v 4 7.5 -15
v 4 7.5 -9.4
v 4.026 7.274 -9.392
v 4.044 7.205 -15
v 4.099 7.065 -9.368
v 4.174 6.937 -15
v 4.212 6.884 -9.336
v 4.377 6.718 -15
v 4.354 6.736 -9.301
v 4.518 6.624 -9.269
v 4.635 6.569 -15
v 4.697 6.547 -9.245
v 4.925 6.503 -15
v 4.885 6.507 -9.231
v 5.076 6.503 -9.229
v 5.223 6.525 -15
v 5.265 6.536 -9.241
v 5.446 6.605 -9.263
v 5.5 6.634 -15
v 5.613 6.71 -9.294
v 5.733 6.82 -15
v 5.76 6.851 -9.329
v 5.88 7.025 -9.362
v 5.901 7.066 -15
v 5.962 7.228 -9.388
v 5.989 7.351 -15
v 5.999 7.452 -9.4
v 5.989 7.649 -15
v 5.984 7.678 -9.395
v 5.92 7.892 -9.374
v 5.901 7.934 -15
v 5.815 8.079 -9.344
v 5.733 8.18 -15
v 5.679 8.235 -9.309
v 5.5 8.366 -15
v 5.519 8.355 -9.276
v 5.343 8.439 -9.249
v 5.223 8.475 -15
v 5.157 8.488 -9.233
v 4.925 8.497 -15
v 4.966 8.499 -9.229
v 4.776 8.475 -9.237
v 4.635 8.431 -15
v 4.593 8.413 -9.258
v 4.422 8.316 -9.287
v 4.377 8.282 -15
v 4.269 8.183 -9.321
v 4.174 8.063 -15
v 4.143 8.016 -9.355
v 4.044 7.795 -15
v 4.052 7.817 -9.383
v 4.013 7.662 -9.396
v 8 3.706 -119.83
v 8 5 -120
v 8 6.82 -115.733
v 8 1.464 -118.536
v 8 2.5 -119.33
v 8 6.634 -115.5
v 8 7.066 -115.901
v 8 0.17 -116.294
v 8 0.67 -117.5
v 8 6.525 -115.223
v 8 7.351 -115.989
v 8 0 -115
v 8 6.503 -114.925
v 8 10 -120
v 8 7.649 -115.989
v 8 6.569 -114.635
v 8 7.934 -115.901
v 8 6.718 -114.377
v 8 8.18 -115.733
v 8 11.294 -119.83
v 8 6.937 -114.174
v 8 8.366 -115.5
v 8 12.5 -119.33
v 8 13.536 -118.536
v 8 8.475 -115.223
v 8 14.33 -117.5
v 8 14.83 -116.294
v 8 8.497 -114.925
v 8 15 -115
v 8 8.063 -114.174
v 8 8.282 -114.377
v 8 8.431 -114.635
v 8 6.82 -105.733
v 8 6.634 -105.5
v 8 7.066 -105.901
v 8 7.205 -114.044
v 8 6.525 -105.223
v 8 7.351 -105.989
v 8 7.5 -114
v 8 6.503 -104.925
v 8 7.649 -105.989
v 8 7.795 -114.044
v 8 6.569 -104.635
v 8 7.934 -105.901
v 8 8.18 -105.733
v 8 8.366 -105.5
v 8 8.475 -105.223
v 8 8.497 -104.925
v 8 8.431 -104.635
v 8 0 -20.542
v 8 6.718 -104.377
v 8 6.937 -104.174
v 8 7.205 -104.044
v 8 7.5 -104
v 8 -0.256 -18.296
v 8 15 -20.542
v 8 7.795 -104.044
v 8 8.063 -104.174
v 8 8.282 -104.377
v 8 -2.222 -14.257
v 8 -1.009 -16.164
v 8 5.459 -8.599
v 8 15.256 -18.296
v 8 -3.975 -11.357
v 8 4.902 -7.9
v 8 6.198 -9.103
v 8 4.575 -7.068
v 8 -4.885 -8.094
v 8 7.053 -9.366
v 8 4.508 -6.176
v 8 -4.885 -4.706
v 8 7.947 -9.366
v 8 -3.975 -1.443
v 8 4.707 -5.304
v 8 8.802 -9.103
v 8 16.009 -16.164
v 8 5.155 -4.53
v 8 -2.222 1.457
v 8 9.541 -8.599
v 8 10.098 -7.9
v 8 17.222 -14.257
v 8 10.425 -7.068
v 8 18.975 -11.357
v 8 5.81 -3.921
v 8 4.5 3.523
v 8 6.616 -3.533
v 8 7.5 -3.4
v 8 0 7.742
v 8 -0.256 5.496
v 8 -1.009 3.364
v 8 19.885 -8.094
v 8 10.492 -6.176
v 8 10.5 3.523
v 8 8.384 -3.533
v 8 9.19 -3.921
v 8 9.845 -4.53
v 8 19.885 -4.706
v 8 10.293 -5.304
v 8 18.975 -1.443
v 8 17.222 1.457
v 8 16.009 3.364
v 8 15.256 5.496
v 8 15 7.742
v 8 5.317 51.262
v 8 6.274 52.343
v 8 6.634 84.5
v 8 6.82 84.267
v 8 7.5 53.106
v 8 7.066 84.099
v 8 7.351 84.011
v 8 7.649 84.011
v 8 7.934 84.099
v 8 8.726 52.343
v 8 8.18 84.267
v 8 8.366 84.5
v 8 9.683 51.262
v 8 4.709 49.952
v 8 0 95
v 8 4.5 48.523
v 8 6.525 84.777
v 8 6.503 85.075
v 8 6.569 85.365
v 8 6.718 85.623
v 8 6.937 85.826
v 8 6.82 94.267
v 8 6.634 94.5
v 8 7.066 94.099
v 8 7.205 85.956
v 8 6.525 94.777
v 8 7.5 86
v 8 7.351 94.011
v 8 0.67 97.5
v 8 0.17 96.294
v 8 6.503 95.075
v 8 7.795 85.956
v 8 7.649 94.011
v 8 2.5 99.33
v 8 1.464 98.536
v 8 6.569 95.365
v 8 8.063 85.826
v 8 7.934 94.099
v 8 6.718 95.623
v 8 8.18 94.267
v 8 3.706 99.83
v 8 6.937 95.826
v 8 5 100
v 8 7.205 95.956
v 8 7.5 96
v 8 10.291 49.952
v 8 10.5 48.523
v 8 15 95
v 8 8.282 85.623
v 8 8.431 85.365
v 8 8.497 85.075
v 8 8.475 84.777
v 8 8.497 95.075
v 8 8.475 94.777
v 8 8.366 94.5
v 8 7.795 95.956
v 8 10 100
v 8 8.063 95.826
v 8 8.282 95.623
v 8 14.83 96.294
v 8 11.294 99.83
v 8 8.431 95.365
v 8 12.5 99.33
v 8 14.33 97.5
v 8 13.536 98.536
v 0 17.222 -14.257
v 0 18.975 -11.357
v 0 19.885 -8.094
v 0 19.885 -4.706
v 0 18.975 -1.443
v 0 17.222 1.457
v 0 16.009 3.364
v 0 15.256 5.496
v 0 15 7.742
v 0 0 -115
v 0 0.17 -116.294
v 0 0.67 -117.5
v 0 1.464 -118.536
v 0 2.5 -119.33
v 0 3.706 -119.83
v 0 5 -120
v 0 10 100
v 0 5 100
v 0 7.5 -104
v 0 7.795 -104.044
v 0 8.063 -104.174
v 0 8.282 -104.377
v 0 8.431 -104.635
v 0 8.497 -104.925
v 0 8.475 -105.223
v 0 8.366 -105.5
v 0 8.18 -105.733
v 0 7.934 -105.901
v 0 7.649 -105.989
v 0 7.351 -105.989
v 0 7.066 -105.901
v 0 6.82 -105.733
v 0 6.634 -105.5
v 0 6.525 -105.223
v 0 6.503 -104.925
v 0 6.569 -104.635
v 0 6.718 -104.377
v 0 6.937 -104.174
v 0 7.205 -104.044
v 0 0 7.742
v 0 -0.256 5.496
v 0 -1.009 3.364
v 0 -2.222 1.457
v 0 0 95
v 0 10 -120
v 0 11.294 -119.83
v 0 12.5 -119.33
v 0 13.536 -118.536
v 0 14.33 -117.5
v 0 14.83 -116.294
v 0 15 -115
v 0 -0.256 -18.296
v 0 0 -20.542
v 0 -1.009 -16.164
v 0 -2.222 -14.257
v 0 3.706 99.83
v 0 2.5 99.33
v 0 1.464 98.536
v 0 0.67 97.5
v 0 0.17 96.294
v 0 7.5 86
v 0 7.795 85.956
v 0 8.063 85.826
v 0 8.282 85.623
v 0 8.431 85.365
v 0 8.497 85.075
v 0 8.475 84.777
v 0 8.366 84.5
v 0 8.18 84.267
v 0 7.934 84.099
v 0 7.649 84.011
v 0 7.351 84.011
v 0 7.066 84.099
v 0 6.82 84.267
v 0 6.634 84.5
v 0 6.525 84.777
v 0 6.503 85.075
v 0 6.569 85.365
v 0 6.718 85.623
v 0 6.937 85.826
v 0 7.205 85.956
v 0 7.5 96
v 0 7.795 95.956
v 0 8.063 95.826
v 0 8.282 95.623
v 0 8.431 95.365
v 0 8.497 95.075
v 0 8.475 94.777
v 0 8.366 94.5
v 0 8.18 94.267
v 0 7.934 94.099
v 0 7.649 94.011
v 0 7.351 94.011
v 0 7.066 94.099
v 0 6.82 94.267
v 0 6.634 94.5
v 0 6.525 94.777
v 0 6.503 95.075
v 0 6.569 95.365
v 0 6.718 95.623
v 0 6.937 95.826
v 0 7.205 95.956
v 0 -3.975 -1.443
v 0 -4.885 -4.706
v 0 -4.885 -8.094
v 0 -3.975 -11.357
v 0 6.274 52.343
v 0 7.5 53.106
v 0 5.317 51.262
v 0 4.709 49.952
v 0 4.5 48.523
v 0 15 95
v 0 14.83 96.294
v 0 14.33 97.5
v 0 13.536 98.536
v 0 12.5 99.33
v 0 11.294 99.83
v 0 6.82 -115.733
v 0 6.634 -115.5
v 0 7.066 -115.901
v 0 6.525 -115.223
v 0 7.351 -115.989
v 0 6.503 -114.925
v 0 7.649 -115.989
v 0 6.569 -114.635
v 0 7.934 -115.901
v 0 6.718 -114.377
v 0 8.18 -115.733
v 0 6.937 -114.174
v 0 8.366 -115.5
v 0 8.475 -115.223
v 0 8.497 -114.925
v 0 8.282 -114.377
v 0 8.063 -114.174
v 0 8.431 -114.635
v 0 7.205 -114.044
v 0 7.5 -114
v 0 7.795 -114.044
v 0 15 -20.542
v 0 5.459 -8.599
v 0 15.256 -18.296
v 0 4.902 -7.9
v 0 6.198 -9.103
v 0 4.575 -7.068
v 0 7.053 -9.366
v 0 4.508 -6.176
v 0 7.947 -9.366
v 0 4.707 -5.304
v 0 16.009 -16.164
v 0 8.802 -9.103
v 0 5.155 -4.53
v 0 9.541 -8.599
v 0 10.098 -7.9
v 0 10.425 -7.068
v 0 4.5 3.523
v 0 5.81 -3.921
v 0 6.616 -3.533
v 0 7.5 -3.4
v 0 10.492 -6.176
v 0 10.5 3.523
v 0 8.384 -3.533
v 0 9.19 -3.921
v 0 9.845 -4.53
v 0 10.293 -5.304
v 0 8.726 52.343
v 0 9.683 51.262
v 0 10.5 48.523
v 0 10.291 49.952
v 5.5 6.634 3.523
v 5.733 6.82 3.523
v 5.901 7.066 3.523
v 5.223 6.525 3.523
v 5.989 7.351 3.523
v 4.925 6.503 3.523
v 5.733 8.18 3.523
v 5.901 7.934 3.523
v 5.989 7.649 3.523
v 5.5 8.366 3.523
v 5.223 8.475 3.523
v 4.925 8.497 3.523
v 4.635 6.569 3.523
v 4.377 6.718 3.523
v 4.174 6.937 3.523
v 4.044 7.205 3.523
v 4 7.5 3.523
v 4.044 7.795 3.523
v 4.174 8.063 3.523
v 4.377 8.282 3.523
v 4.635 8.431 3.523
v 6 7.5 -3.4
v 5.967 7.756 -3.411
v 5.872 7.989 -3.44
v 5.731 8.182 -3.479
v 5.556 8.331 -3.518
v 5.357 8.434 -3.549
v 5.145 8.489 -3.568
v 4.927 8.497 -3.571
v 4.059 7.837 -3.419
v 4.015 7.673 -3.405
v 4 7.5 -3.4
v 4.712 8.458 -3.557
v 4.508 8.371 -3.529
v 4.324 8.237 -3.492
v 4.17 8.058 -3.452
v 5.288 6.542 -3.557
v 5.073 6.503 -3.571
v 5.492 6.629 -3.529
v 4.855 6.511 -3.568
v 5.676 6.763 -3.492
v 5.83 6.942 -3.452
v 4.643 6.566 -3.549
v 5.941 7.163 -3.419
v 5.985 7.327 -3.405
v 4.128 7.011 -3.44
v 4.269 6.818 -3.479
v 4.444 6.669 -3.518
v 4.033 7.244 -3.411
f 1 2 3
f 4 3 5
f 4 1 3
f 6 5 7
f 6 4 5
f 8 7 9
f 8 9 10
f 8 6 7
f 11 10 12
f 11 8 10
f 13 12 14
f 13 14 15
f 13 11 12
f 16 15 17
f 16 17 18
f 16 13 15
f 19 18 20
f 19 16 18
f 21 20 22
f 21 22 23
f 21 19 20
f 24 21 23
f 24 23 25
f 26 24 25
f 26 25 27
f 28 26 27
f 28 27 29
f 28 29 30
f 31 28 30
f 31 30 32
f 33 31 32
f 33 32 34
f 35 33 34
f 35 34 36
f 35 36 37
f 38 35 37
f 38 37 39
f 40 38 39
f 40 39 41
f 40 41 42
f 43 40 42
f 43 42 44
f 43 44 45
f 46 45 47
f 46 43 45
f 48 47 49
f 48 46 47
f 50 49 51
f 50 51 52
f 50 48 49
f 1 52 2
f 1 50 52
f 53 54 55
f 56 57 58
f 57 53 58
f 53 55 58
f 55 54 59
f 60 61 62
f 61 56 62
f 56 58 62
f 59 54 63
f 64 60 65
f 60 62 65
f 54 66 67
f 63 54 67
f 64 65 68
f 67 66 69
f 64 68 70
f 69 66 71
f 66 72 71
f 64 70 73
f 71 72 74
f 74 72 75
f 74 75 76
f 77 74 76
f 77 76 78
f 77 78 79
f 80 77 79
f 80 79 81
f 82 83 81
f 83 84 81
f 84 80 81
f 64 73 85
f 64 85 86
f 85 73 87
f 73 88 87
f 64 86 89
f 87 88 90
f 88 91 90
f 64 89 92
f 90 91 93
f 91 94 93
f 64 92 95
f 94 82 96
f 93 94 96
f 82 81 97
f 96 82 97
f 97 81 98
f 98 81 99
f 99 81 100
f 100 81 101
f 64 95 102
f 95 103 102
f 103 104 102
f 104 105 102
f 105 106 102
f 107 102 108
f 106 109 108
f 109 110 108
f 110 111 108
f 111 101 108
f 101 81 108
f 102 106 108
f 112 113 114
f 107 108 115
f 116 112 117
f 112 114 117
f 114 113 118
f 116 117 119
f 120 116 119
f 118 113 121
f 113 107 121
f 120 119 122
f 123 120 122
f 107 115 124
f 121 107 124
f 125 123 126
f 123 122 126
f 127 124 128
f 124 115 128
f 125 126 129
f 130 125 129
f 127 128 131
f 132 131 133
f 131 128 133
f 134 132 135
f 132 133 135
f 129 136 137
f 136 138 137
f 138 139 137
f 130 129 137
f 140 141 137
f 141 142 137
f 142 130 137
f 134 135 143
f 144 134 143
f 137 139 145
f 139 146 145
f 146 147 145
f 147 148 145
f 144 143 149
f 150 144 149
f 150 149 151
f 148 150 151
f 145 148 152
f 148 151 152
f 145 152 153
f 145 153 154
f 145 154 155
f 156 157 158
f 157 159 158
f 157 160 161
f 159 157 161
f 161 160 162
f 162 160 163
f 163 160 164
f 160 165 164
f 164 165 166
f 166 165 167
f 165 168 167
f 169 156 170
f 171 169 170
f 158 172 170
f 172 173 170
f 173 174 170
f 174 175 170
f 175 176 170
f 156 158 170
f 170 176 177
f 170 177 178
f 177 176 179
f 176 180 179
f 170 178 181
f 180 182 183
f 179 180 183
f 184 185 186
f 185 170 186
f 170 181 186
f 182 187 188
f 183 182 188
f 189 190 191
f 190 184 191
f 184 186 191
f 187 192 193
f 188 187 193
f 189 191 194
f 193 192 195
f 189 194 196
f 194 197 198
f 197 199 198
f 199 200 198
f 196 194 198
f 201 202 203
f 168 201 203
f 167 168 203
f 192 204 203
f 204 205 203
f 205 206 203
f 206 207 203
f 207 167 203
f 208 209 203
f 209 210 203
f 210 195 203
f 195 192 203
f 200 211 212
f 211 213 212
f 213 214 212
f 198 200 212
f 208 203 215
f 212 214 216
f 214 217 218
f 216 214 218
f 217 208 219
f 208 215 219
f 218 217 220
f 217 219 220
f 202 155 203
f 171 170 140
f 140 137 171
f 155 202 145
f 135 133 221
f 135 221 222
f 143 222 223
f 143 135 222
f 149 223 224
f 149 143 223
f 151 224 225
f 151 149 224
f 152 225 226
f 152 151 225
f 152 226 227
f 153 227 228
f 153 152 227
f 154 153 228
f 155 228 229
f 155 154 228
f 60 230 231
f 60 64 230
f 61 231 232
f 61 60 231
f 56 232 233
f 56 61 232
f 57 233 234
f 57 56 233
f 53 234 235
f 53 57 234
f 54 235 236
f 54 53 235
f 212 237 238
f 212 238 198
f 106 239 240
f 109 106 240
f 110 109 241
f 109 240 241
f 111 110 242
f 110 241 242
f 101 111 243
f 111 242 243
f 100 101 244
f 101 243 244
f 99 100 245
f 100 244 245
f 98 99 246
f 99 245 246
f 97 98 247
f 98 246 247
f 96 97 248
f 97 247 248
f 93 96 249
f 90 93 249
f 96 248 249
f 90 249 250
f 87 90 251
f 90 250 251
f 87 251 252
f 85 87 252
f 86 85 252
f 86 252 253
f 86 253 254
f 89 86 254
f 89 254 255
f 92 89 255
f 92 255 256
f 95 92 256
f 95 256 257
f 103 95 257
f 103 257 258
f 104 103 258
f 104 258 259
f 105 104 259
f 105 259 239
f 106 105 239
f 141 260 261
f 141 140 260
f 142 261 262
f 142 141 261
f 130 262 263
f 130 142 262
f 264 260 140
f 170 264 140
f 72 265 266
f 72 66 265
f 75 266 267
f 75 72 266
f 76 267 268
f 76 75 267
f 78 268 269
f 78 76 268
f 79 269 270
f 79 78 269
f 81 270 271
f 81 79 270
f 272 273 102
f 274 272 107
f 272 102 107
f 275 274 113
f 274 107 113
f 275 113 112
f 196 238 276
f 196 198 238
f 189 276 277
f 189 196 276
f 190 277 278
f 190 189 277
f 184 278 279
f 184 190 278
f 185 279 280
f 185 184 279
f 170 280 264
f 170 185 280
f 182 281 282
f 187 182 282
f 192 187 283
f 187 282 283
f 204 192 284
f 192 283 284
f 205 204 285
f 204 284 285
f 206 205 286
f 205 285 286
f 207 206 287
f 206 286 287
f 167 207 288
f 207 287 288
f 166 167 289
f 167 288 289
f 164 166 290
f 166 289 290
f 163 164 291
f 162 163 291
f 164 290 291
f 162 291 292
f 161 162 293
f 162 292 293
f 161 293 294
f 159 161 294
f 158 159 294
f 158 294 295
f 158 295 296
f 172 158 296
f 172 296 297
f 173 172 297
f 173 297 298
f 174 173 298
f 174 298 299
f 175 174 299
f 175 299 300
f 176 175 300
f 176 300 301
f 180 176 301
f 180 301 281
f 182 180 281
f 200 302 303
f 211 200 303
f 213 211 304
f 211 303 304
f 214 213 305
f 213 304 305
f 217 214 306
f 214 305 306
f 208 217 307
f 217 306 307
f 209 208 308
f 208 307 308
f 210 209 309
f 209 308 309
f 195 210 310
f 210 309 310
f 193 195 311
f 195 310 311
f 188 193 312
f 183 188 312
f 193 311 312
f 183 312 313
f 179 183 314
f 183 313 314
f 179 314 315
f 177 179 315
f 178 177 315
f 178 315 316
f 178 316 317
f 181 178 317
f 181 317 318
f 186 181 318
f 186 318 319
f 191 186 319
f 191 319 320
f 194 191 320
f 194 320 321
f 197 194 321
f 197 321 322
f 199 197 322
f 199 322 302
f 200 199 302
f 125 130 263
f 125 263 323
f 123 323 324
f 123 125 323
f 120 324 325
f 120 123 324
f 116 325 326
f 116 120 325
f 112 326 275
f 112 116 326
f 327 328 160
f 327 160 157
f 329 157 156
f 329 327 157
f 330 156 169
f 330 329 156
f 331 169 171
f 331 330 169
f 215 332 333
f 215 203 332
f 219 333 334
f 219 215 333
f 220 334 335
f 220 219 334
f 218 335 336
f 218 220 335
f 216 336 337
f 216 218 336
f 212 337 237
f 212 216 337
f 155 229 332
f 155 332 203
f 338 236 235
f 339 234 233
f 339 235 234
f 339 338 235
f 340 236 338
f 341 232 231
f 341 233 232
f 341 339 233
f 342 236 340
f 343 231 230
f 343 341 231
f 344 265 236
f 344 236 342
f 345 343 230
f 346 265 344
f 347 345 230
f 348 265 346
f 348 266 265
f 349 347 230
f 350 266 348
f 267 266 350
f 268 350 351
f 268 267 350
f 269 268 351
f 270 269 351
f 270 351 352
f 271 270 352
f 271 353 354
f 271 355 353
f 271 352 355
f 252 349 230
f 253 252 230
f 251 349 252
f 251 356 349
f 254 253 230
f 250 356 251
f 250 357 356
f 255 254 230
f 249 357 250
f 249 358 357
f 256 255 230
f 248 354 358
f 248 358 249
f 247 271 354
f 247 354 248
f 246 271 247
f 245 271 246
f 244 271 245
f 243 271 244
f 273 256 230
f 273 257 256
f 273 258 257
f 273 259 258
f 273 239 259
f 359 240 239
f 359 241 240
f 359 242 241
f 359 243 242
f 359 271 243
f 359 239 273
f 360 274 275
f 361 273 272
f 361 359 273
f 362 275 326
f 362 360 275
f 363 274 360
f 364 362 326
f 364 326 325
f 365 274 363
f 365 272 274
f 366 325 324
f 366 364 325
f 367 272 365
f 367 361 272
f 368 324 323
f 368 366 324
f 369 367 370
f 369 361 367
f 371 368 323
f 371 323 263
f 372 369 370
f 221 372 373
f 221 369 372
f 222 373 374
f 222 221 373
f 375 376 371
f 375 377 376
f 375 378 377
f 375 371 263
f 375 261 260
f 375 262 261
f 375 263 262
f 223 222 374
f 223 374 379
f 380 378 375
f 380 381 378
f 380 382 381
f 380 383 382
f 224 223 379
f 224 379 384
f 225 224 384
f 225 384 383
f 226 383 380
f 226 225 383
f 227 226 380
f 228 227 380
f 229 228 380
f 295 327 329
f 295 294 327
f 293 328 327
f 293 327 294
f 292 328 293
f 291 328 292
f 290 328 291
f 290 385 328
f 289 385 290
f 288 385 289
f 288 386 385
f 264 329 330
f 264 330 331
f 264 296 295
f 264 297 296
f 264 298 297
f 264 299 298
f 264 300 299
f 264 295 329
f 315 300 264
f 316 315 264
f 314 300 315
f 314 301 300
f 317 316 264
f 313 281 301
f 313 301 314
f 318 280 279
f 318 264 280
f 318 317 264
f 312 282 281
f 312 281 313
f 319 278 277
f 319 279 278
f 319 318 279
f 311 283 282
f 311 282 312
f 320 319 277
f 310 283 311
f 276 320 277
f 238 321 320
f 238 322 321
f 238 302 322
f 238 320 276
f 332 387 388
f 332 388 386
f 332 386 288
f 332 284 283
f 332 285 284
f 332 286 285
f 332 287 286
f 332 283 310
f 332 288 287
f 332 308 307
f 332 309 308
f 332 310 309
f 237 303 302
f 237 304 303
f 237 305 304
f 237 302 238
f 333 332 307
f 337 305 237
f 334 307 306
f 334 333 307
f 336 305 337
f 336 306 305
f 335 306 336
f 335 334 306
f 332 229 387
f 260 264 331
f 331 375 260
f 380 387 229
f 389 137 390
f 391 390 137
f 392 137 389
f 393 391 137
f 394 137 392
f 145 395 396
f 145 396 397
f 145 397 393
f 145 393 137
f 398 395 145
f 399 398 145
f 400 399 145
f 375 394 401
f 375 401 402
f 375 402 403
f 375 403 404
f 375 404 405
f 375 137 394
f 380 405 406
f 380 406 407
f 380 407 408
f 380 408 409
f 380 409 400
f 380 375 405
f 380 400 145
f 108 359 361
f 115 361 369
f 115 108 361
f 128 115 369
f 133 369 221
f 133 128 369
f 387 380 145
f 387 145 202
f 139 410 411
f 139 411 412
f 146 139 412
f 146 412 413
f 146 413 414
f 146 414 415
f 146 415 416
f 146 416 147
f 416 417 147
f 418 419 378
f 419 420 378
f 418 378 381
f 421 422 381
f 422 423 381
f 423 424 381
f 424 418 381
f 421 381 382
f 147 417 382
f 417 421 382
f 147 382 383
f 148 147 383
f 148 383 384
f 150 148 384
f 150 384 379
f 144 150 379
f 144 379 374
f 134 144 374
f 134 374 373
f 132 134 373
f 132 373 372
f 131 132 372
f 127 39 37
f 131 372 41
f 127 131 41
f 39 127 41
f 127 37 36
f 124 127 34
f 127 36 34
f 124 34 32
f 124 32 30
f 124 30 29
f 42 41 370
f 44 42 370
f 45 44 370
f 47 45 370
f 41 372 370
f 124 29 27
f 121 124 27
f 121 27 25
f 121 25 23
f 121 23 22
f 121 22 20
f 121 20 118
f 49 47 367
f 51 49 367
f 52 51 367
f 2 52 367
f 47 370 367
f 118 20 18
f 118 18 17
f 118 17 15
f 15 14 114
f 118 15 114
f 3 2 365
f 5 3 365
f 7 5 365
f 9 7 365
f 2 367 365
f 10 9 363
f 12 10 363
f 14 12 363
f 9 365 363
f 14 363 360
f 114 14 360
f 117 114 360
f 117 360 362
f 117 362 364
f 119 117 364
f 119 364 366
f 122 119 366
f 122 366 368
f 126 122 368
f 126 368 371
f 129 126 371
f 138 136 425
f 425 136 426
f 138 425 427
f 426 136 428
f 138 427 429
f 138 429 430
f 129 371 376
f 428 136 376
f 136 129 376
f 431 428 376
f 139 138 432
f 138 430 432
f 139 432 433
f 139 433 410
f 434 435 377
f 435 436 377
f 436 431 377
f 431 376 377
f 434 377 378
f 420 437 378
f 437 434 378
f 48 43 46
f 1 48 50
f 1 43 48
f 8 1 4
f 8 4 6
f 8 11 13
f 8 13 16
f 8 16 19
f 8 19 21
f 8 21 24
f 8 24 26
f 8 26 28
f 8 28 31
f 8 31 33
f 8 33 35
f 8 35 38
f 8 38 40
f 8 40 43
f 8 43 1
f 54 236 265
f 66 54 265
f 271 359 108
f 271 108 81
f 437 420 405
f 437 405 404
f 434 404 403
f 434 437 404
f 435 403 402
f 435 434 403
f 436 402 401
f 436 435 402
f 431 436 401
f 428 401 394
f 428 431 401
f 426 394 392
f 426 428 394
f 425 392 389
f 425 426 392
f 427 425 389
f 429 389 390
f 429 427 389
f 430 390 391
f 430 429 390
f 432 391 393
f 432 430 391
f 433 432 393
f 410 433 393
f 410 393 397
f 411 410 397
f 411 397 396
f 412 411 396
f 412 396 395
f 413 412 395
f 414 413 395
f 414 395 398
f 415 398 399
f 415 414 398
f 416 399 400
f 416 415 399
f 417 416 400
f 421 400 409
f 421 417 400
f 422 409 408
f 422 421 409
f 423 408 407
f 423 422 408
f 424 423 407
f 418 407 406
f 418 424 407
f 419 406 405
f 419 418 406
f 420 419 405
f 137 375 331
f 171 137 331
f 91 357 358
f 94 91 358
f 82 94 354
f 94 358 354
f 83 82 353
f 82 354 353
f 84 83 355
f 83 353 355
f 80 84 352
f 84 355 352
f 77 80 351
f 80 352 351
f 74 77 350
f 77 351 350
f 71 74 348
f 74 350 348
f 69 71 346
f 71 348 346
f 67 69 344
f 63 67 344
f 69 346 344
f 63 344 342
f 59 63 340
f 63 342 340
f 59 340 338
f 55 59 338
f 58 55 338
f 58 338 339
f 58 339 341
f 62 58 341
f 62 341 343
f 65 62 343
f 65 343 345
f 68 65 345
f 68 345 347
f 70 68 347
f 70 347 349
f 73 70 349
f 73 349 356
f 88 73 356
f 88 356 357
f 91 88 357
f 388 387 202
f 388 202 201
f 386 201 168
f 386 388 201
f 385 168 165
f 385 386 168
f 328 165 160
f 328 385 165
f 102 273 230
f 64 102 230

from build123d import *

# Parameters (mm, degrees)
SKETCH_1_W               = 120
SKETCH_1_H               = 15
EXTRUDE_1_DEPTH          = 8
FILLET_1_R               = 5
SKETCH_6_R               = 12.5
EXTRUDE_2_DEPTH          = 8
SKETCH_8_R               = 3
CUT_EXTRUDE_5_DEPTH      = 23
SKETCH_9_W               = 8
SKETCH_9_H               = 15
EXTRUDE_3_DEPTH          = 100
SKETCH_10_W              = 50
SKETCH_10_H              = 6
CUT_EXTRUDE_6_DEPTH      = 10
CUT_EXTRUDE_7_DEPTH      = 7
CUT_EXTRUDE_7_DEPTH_BACK = 15
SKETCH_4_R               = 1
FILLET_2_R               = 10
FILLET_4_R               = 5
FILLET_5_R               = 5
SKETCH_11_R              = 1
CUT_EXTRUDE_8_DEPTH      = 10


with BuildPart() as part:
    # 草图1 → 凸台-拉伸1 (new body)
    with BuildSketch(Plane(origin=(0, 0, 0), x_dir=(0, 0, -1), z_dir=(1, 0, 0))):
        with Locations((60, 7.5)):
            Rectangle(SKETCH_1_W, SKETCH_1_H)
    extrude(amount=EXTRUDE_1_DEPTH)

    # 圆角1
    fillet_1_edges = [part.edges().sort_by_distance(p)[0] for p in [
        (4, 15, 0),
        (4, 15, -120),
        (4, 0, -120),
        (4, 0, 0),
    ]]
    fillet(fillet_1_edges, radius=FILLET_1_R)

    # 草图6 → 凸台-拉伸2 (add)
    with BuildSketch(Plane(origin=(8, 0, 0), x_dir=(0, 0, -1), z_dir=(1, 0, 0))):
        with Locations((6.4, 7.5)):
            Circle(SKETCH_6_R)
    extrude(amount=-EXTRUDE_2_DEPTH)

    # 草图8 → 切除-拉伸5 (cut)
    with BuildSketch(Plane.ZY):
        with Locations((-6.4, 7.5)):
            Circle(SKETCH_8_R)
    extrude(amount=-CUT_EXTRUDE_5_DEPTH, mode=Mode.SUBTRACT)

    # 草图9 → 凸台-拉伸3 (add)
    with BuildSketch(Plane.XY):
        with Locations((4, 7.5)):
            Rectangle(SKETCH_9_W, SKETCH_9_H)
    extrude(amount=EXTRUDE_3_DEPTH)

    # 草图10 → 切除-拉伸6 (cut)
    with BuildSketch(Plane.ZY):
        with Locations((28.522995474, 7.5)):
            Rectangle(SKETCH_10_W, SKETCH_10_H)
    extrude(amount=-CUT_EXTRUDE_6_DEPTH, mode=Mode.SUBTRACT)

    # 草图4 → 切除-拉伸7 (cut, two sides: drawn at the far end of the back side and taken through both)
    with BuildSketch(Plane.XY.offset(-CUT_EXTRUDE_7_DEPTH_BACK)):
        with Locations(Location((5, 7.5, 0), (0, 0, 180))):
            Circle(SKETCH_4_R)
    extrude(amount=CUT_EXTRUDE_7_DEPTH + CUT_EXTRUDE_7_DEPTH_BACK, mode=Mode.SUBTRACT)

    # 圆角2
    fillet_2_edges = [part.edges().sort_by_distance(p)[0] for p in [
        (4, 0, -16.4),
        (4, 15, -16.4),
        (4, 15, 3.6),
        (4, 0, 3.6),
    ]]
    fillet(fillet_2_edges, radius=FILLET_2_R)

    # 圆角4
    fillet_4_edges = [part.edges().sort_by_distance(p)[0] for p in [
        (4, 0, 100),
        (4, 15, 100),
    ]]
    fillet(fillet_4_edges, radius=FILLET_4_R)

    # 圆角5
    # the kernel refuses this fillet: 5 mm, written as the material it adds along each edge
    with BuildSketch(Plane(origin=(0, 10.5, 53.522995474), x_dir=(0, 0, -1), z_dir=(1, 0, 0)), Plane(origin=(0, 4.5, 53.522995474), x_dir=(0, 1, 0), z_dir=(1, 0, 0))) as fillet_5_piece_1:
        with BuildLine():
            CenterArc((FILLET_5_R, -FILLET_5_R), FILLET_5_R, 90, 90)
            Line((0, -FILLET_5_R), (0, 0))
            Line((0, 0), (FILLET_5_R, 0))
        make_face()
    extrude(amount=8)

    # 草图11 → 切除-拉伸8 (cut)
    with BuildSketch(Plane.ZY):
        with Locations((-115, 7.5)):
            Circle(SKETCH_11_R)
        with Locations((-105, 7.5)):
            Circle(SKETCH_11_R)
        with Locations((85, 7.5)):
            Circle(SKETCH_11_R)
        with Locations((95, 7.5)):
            Circle(SKETCH_11_R)
    extrude(amount=-CUT_EXTRUDE_8_DEPTH, mode=Mode.SUBTRACT)


solid = part.part
